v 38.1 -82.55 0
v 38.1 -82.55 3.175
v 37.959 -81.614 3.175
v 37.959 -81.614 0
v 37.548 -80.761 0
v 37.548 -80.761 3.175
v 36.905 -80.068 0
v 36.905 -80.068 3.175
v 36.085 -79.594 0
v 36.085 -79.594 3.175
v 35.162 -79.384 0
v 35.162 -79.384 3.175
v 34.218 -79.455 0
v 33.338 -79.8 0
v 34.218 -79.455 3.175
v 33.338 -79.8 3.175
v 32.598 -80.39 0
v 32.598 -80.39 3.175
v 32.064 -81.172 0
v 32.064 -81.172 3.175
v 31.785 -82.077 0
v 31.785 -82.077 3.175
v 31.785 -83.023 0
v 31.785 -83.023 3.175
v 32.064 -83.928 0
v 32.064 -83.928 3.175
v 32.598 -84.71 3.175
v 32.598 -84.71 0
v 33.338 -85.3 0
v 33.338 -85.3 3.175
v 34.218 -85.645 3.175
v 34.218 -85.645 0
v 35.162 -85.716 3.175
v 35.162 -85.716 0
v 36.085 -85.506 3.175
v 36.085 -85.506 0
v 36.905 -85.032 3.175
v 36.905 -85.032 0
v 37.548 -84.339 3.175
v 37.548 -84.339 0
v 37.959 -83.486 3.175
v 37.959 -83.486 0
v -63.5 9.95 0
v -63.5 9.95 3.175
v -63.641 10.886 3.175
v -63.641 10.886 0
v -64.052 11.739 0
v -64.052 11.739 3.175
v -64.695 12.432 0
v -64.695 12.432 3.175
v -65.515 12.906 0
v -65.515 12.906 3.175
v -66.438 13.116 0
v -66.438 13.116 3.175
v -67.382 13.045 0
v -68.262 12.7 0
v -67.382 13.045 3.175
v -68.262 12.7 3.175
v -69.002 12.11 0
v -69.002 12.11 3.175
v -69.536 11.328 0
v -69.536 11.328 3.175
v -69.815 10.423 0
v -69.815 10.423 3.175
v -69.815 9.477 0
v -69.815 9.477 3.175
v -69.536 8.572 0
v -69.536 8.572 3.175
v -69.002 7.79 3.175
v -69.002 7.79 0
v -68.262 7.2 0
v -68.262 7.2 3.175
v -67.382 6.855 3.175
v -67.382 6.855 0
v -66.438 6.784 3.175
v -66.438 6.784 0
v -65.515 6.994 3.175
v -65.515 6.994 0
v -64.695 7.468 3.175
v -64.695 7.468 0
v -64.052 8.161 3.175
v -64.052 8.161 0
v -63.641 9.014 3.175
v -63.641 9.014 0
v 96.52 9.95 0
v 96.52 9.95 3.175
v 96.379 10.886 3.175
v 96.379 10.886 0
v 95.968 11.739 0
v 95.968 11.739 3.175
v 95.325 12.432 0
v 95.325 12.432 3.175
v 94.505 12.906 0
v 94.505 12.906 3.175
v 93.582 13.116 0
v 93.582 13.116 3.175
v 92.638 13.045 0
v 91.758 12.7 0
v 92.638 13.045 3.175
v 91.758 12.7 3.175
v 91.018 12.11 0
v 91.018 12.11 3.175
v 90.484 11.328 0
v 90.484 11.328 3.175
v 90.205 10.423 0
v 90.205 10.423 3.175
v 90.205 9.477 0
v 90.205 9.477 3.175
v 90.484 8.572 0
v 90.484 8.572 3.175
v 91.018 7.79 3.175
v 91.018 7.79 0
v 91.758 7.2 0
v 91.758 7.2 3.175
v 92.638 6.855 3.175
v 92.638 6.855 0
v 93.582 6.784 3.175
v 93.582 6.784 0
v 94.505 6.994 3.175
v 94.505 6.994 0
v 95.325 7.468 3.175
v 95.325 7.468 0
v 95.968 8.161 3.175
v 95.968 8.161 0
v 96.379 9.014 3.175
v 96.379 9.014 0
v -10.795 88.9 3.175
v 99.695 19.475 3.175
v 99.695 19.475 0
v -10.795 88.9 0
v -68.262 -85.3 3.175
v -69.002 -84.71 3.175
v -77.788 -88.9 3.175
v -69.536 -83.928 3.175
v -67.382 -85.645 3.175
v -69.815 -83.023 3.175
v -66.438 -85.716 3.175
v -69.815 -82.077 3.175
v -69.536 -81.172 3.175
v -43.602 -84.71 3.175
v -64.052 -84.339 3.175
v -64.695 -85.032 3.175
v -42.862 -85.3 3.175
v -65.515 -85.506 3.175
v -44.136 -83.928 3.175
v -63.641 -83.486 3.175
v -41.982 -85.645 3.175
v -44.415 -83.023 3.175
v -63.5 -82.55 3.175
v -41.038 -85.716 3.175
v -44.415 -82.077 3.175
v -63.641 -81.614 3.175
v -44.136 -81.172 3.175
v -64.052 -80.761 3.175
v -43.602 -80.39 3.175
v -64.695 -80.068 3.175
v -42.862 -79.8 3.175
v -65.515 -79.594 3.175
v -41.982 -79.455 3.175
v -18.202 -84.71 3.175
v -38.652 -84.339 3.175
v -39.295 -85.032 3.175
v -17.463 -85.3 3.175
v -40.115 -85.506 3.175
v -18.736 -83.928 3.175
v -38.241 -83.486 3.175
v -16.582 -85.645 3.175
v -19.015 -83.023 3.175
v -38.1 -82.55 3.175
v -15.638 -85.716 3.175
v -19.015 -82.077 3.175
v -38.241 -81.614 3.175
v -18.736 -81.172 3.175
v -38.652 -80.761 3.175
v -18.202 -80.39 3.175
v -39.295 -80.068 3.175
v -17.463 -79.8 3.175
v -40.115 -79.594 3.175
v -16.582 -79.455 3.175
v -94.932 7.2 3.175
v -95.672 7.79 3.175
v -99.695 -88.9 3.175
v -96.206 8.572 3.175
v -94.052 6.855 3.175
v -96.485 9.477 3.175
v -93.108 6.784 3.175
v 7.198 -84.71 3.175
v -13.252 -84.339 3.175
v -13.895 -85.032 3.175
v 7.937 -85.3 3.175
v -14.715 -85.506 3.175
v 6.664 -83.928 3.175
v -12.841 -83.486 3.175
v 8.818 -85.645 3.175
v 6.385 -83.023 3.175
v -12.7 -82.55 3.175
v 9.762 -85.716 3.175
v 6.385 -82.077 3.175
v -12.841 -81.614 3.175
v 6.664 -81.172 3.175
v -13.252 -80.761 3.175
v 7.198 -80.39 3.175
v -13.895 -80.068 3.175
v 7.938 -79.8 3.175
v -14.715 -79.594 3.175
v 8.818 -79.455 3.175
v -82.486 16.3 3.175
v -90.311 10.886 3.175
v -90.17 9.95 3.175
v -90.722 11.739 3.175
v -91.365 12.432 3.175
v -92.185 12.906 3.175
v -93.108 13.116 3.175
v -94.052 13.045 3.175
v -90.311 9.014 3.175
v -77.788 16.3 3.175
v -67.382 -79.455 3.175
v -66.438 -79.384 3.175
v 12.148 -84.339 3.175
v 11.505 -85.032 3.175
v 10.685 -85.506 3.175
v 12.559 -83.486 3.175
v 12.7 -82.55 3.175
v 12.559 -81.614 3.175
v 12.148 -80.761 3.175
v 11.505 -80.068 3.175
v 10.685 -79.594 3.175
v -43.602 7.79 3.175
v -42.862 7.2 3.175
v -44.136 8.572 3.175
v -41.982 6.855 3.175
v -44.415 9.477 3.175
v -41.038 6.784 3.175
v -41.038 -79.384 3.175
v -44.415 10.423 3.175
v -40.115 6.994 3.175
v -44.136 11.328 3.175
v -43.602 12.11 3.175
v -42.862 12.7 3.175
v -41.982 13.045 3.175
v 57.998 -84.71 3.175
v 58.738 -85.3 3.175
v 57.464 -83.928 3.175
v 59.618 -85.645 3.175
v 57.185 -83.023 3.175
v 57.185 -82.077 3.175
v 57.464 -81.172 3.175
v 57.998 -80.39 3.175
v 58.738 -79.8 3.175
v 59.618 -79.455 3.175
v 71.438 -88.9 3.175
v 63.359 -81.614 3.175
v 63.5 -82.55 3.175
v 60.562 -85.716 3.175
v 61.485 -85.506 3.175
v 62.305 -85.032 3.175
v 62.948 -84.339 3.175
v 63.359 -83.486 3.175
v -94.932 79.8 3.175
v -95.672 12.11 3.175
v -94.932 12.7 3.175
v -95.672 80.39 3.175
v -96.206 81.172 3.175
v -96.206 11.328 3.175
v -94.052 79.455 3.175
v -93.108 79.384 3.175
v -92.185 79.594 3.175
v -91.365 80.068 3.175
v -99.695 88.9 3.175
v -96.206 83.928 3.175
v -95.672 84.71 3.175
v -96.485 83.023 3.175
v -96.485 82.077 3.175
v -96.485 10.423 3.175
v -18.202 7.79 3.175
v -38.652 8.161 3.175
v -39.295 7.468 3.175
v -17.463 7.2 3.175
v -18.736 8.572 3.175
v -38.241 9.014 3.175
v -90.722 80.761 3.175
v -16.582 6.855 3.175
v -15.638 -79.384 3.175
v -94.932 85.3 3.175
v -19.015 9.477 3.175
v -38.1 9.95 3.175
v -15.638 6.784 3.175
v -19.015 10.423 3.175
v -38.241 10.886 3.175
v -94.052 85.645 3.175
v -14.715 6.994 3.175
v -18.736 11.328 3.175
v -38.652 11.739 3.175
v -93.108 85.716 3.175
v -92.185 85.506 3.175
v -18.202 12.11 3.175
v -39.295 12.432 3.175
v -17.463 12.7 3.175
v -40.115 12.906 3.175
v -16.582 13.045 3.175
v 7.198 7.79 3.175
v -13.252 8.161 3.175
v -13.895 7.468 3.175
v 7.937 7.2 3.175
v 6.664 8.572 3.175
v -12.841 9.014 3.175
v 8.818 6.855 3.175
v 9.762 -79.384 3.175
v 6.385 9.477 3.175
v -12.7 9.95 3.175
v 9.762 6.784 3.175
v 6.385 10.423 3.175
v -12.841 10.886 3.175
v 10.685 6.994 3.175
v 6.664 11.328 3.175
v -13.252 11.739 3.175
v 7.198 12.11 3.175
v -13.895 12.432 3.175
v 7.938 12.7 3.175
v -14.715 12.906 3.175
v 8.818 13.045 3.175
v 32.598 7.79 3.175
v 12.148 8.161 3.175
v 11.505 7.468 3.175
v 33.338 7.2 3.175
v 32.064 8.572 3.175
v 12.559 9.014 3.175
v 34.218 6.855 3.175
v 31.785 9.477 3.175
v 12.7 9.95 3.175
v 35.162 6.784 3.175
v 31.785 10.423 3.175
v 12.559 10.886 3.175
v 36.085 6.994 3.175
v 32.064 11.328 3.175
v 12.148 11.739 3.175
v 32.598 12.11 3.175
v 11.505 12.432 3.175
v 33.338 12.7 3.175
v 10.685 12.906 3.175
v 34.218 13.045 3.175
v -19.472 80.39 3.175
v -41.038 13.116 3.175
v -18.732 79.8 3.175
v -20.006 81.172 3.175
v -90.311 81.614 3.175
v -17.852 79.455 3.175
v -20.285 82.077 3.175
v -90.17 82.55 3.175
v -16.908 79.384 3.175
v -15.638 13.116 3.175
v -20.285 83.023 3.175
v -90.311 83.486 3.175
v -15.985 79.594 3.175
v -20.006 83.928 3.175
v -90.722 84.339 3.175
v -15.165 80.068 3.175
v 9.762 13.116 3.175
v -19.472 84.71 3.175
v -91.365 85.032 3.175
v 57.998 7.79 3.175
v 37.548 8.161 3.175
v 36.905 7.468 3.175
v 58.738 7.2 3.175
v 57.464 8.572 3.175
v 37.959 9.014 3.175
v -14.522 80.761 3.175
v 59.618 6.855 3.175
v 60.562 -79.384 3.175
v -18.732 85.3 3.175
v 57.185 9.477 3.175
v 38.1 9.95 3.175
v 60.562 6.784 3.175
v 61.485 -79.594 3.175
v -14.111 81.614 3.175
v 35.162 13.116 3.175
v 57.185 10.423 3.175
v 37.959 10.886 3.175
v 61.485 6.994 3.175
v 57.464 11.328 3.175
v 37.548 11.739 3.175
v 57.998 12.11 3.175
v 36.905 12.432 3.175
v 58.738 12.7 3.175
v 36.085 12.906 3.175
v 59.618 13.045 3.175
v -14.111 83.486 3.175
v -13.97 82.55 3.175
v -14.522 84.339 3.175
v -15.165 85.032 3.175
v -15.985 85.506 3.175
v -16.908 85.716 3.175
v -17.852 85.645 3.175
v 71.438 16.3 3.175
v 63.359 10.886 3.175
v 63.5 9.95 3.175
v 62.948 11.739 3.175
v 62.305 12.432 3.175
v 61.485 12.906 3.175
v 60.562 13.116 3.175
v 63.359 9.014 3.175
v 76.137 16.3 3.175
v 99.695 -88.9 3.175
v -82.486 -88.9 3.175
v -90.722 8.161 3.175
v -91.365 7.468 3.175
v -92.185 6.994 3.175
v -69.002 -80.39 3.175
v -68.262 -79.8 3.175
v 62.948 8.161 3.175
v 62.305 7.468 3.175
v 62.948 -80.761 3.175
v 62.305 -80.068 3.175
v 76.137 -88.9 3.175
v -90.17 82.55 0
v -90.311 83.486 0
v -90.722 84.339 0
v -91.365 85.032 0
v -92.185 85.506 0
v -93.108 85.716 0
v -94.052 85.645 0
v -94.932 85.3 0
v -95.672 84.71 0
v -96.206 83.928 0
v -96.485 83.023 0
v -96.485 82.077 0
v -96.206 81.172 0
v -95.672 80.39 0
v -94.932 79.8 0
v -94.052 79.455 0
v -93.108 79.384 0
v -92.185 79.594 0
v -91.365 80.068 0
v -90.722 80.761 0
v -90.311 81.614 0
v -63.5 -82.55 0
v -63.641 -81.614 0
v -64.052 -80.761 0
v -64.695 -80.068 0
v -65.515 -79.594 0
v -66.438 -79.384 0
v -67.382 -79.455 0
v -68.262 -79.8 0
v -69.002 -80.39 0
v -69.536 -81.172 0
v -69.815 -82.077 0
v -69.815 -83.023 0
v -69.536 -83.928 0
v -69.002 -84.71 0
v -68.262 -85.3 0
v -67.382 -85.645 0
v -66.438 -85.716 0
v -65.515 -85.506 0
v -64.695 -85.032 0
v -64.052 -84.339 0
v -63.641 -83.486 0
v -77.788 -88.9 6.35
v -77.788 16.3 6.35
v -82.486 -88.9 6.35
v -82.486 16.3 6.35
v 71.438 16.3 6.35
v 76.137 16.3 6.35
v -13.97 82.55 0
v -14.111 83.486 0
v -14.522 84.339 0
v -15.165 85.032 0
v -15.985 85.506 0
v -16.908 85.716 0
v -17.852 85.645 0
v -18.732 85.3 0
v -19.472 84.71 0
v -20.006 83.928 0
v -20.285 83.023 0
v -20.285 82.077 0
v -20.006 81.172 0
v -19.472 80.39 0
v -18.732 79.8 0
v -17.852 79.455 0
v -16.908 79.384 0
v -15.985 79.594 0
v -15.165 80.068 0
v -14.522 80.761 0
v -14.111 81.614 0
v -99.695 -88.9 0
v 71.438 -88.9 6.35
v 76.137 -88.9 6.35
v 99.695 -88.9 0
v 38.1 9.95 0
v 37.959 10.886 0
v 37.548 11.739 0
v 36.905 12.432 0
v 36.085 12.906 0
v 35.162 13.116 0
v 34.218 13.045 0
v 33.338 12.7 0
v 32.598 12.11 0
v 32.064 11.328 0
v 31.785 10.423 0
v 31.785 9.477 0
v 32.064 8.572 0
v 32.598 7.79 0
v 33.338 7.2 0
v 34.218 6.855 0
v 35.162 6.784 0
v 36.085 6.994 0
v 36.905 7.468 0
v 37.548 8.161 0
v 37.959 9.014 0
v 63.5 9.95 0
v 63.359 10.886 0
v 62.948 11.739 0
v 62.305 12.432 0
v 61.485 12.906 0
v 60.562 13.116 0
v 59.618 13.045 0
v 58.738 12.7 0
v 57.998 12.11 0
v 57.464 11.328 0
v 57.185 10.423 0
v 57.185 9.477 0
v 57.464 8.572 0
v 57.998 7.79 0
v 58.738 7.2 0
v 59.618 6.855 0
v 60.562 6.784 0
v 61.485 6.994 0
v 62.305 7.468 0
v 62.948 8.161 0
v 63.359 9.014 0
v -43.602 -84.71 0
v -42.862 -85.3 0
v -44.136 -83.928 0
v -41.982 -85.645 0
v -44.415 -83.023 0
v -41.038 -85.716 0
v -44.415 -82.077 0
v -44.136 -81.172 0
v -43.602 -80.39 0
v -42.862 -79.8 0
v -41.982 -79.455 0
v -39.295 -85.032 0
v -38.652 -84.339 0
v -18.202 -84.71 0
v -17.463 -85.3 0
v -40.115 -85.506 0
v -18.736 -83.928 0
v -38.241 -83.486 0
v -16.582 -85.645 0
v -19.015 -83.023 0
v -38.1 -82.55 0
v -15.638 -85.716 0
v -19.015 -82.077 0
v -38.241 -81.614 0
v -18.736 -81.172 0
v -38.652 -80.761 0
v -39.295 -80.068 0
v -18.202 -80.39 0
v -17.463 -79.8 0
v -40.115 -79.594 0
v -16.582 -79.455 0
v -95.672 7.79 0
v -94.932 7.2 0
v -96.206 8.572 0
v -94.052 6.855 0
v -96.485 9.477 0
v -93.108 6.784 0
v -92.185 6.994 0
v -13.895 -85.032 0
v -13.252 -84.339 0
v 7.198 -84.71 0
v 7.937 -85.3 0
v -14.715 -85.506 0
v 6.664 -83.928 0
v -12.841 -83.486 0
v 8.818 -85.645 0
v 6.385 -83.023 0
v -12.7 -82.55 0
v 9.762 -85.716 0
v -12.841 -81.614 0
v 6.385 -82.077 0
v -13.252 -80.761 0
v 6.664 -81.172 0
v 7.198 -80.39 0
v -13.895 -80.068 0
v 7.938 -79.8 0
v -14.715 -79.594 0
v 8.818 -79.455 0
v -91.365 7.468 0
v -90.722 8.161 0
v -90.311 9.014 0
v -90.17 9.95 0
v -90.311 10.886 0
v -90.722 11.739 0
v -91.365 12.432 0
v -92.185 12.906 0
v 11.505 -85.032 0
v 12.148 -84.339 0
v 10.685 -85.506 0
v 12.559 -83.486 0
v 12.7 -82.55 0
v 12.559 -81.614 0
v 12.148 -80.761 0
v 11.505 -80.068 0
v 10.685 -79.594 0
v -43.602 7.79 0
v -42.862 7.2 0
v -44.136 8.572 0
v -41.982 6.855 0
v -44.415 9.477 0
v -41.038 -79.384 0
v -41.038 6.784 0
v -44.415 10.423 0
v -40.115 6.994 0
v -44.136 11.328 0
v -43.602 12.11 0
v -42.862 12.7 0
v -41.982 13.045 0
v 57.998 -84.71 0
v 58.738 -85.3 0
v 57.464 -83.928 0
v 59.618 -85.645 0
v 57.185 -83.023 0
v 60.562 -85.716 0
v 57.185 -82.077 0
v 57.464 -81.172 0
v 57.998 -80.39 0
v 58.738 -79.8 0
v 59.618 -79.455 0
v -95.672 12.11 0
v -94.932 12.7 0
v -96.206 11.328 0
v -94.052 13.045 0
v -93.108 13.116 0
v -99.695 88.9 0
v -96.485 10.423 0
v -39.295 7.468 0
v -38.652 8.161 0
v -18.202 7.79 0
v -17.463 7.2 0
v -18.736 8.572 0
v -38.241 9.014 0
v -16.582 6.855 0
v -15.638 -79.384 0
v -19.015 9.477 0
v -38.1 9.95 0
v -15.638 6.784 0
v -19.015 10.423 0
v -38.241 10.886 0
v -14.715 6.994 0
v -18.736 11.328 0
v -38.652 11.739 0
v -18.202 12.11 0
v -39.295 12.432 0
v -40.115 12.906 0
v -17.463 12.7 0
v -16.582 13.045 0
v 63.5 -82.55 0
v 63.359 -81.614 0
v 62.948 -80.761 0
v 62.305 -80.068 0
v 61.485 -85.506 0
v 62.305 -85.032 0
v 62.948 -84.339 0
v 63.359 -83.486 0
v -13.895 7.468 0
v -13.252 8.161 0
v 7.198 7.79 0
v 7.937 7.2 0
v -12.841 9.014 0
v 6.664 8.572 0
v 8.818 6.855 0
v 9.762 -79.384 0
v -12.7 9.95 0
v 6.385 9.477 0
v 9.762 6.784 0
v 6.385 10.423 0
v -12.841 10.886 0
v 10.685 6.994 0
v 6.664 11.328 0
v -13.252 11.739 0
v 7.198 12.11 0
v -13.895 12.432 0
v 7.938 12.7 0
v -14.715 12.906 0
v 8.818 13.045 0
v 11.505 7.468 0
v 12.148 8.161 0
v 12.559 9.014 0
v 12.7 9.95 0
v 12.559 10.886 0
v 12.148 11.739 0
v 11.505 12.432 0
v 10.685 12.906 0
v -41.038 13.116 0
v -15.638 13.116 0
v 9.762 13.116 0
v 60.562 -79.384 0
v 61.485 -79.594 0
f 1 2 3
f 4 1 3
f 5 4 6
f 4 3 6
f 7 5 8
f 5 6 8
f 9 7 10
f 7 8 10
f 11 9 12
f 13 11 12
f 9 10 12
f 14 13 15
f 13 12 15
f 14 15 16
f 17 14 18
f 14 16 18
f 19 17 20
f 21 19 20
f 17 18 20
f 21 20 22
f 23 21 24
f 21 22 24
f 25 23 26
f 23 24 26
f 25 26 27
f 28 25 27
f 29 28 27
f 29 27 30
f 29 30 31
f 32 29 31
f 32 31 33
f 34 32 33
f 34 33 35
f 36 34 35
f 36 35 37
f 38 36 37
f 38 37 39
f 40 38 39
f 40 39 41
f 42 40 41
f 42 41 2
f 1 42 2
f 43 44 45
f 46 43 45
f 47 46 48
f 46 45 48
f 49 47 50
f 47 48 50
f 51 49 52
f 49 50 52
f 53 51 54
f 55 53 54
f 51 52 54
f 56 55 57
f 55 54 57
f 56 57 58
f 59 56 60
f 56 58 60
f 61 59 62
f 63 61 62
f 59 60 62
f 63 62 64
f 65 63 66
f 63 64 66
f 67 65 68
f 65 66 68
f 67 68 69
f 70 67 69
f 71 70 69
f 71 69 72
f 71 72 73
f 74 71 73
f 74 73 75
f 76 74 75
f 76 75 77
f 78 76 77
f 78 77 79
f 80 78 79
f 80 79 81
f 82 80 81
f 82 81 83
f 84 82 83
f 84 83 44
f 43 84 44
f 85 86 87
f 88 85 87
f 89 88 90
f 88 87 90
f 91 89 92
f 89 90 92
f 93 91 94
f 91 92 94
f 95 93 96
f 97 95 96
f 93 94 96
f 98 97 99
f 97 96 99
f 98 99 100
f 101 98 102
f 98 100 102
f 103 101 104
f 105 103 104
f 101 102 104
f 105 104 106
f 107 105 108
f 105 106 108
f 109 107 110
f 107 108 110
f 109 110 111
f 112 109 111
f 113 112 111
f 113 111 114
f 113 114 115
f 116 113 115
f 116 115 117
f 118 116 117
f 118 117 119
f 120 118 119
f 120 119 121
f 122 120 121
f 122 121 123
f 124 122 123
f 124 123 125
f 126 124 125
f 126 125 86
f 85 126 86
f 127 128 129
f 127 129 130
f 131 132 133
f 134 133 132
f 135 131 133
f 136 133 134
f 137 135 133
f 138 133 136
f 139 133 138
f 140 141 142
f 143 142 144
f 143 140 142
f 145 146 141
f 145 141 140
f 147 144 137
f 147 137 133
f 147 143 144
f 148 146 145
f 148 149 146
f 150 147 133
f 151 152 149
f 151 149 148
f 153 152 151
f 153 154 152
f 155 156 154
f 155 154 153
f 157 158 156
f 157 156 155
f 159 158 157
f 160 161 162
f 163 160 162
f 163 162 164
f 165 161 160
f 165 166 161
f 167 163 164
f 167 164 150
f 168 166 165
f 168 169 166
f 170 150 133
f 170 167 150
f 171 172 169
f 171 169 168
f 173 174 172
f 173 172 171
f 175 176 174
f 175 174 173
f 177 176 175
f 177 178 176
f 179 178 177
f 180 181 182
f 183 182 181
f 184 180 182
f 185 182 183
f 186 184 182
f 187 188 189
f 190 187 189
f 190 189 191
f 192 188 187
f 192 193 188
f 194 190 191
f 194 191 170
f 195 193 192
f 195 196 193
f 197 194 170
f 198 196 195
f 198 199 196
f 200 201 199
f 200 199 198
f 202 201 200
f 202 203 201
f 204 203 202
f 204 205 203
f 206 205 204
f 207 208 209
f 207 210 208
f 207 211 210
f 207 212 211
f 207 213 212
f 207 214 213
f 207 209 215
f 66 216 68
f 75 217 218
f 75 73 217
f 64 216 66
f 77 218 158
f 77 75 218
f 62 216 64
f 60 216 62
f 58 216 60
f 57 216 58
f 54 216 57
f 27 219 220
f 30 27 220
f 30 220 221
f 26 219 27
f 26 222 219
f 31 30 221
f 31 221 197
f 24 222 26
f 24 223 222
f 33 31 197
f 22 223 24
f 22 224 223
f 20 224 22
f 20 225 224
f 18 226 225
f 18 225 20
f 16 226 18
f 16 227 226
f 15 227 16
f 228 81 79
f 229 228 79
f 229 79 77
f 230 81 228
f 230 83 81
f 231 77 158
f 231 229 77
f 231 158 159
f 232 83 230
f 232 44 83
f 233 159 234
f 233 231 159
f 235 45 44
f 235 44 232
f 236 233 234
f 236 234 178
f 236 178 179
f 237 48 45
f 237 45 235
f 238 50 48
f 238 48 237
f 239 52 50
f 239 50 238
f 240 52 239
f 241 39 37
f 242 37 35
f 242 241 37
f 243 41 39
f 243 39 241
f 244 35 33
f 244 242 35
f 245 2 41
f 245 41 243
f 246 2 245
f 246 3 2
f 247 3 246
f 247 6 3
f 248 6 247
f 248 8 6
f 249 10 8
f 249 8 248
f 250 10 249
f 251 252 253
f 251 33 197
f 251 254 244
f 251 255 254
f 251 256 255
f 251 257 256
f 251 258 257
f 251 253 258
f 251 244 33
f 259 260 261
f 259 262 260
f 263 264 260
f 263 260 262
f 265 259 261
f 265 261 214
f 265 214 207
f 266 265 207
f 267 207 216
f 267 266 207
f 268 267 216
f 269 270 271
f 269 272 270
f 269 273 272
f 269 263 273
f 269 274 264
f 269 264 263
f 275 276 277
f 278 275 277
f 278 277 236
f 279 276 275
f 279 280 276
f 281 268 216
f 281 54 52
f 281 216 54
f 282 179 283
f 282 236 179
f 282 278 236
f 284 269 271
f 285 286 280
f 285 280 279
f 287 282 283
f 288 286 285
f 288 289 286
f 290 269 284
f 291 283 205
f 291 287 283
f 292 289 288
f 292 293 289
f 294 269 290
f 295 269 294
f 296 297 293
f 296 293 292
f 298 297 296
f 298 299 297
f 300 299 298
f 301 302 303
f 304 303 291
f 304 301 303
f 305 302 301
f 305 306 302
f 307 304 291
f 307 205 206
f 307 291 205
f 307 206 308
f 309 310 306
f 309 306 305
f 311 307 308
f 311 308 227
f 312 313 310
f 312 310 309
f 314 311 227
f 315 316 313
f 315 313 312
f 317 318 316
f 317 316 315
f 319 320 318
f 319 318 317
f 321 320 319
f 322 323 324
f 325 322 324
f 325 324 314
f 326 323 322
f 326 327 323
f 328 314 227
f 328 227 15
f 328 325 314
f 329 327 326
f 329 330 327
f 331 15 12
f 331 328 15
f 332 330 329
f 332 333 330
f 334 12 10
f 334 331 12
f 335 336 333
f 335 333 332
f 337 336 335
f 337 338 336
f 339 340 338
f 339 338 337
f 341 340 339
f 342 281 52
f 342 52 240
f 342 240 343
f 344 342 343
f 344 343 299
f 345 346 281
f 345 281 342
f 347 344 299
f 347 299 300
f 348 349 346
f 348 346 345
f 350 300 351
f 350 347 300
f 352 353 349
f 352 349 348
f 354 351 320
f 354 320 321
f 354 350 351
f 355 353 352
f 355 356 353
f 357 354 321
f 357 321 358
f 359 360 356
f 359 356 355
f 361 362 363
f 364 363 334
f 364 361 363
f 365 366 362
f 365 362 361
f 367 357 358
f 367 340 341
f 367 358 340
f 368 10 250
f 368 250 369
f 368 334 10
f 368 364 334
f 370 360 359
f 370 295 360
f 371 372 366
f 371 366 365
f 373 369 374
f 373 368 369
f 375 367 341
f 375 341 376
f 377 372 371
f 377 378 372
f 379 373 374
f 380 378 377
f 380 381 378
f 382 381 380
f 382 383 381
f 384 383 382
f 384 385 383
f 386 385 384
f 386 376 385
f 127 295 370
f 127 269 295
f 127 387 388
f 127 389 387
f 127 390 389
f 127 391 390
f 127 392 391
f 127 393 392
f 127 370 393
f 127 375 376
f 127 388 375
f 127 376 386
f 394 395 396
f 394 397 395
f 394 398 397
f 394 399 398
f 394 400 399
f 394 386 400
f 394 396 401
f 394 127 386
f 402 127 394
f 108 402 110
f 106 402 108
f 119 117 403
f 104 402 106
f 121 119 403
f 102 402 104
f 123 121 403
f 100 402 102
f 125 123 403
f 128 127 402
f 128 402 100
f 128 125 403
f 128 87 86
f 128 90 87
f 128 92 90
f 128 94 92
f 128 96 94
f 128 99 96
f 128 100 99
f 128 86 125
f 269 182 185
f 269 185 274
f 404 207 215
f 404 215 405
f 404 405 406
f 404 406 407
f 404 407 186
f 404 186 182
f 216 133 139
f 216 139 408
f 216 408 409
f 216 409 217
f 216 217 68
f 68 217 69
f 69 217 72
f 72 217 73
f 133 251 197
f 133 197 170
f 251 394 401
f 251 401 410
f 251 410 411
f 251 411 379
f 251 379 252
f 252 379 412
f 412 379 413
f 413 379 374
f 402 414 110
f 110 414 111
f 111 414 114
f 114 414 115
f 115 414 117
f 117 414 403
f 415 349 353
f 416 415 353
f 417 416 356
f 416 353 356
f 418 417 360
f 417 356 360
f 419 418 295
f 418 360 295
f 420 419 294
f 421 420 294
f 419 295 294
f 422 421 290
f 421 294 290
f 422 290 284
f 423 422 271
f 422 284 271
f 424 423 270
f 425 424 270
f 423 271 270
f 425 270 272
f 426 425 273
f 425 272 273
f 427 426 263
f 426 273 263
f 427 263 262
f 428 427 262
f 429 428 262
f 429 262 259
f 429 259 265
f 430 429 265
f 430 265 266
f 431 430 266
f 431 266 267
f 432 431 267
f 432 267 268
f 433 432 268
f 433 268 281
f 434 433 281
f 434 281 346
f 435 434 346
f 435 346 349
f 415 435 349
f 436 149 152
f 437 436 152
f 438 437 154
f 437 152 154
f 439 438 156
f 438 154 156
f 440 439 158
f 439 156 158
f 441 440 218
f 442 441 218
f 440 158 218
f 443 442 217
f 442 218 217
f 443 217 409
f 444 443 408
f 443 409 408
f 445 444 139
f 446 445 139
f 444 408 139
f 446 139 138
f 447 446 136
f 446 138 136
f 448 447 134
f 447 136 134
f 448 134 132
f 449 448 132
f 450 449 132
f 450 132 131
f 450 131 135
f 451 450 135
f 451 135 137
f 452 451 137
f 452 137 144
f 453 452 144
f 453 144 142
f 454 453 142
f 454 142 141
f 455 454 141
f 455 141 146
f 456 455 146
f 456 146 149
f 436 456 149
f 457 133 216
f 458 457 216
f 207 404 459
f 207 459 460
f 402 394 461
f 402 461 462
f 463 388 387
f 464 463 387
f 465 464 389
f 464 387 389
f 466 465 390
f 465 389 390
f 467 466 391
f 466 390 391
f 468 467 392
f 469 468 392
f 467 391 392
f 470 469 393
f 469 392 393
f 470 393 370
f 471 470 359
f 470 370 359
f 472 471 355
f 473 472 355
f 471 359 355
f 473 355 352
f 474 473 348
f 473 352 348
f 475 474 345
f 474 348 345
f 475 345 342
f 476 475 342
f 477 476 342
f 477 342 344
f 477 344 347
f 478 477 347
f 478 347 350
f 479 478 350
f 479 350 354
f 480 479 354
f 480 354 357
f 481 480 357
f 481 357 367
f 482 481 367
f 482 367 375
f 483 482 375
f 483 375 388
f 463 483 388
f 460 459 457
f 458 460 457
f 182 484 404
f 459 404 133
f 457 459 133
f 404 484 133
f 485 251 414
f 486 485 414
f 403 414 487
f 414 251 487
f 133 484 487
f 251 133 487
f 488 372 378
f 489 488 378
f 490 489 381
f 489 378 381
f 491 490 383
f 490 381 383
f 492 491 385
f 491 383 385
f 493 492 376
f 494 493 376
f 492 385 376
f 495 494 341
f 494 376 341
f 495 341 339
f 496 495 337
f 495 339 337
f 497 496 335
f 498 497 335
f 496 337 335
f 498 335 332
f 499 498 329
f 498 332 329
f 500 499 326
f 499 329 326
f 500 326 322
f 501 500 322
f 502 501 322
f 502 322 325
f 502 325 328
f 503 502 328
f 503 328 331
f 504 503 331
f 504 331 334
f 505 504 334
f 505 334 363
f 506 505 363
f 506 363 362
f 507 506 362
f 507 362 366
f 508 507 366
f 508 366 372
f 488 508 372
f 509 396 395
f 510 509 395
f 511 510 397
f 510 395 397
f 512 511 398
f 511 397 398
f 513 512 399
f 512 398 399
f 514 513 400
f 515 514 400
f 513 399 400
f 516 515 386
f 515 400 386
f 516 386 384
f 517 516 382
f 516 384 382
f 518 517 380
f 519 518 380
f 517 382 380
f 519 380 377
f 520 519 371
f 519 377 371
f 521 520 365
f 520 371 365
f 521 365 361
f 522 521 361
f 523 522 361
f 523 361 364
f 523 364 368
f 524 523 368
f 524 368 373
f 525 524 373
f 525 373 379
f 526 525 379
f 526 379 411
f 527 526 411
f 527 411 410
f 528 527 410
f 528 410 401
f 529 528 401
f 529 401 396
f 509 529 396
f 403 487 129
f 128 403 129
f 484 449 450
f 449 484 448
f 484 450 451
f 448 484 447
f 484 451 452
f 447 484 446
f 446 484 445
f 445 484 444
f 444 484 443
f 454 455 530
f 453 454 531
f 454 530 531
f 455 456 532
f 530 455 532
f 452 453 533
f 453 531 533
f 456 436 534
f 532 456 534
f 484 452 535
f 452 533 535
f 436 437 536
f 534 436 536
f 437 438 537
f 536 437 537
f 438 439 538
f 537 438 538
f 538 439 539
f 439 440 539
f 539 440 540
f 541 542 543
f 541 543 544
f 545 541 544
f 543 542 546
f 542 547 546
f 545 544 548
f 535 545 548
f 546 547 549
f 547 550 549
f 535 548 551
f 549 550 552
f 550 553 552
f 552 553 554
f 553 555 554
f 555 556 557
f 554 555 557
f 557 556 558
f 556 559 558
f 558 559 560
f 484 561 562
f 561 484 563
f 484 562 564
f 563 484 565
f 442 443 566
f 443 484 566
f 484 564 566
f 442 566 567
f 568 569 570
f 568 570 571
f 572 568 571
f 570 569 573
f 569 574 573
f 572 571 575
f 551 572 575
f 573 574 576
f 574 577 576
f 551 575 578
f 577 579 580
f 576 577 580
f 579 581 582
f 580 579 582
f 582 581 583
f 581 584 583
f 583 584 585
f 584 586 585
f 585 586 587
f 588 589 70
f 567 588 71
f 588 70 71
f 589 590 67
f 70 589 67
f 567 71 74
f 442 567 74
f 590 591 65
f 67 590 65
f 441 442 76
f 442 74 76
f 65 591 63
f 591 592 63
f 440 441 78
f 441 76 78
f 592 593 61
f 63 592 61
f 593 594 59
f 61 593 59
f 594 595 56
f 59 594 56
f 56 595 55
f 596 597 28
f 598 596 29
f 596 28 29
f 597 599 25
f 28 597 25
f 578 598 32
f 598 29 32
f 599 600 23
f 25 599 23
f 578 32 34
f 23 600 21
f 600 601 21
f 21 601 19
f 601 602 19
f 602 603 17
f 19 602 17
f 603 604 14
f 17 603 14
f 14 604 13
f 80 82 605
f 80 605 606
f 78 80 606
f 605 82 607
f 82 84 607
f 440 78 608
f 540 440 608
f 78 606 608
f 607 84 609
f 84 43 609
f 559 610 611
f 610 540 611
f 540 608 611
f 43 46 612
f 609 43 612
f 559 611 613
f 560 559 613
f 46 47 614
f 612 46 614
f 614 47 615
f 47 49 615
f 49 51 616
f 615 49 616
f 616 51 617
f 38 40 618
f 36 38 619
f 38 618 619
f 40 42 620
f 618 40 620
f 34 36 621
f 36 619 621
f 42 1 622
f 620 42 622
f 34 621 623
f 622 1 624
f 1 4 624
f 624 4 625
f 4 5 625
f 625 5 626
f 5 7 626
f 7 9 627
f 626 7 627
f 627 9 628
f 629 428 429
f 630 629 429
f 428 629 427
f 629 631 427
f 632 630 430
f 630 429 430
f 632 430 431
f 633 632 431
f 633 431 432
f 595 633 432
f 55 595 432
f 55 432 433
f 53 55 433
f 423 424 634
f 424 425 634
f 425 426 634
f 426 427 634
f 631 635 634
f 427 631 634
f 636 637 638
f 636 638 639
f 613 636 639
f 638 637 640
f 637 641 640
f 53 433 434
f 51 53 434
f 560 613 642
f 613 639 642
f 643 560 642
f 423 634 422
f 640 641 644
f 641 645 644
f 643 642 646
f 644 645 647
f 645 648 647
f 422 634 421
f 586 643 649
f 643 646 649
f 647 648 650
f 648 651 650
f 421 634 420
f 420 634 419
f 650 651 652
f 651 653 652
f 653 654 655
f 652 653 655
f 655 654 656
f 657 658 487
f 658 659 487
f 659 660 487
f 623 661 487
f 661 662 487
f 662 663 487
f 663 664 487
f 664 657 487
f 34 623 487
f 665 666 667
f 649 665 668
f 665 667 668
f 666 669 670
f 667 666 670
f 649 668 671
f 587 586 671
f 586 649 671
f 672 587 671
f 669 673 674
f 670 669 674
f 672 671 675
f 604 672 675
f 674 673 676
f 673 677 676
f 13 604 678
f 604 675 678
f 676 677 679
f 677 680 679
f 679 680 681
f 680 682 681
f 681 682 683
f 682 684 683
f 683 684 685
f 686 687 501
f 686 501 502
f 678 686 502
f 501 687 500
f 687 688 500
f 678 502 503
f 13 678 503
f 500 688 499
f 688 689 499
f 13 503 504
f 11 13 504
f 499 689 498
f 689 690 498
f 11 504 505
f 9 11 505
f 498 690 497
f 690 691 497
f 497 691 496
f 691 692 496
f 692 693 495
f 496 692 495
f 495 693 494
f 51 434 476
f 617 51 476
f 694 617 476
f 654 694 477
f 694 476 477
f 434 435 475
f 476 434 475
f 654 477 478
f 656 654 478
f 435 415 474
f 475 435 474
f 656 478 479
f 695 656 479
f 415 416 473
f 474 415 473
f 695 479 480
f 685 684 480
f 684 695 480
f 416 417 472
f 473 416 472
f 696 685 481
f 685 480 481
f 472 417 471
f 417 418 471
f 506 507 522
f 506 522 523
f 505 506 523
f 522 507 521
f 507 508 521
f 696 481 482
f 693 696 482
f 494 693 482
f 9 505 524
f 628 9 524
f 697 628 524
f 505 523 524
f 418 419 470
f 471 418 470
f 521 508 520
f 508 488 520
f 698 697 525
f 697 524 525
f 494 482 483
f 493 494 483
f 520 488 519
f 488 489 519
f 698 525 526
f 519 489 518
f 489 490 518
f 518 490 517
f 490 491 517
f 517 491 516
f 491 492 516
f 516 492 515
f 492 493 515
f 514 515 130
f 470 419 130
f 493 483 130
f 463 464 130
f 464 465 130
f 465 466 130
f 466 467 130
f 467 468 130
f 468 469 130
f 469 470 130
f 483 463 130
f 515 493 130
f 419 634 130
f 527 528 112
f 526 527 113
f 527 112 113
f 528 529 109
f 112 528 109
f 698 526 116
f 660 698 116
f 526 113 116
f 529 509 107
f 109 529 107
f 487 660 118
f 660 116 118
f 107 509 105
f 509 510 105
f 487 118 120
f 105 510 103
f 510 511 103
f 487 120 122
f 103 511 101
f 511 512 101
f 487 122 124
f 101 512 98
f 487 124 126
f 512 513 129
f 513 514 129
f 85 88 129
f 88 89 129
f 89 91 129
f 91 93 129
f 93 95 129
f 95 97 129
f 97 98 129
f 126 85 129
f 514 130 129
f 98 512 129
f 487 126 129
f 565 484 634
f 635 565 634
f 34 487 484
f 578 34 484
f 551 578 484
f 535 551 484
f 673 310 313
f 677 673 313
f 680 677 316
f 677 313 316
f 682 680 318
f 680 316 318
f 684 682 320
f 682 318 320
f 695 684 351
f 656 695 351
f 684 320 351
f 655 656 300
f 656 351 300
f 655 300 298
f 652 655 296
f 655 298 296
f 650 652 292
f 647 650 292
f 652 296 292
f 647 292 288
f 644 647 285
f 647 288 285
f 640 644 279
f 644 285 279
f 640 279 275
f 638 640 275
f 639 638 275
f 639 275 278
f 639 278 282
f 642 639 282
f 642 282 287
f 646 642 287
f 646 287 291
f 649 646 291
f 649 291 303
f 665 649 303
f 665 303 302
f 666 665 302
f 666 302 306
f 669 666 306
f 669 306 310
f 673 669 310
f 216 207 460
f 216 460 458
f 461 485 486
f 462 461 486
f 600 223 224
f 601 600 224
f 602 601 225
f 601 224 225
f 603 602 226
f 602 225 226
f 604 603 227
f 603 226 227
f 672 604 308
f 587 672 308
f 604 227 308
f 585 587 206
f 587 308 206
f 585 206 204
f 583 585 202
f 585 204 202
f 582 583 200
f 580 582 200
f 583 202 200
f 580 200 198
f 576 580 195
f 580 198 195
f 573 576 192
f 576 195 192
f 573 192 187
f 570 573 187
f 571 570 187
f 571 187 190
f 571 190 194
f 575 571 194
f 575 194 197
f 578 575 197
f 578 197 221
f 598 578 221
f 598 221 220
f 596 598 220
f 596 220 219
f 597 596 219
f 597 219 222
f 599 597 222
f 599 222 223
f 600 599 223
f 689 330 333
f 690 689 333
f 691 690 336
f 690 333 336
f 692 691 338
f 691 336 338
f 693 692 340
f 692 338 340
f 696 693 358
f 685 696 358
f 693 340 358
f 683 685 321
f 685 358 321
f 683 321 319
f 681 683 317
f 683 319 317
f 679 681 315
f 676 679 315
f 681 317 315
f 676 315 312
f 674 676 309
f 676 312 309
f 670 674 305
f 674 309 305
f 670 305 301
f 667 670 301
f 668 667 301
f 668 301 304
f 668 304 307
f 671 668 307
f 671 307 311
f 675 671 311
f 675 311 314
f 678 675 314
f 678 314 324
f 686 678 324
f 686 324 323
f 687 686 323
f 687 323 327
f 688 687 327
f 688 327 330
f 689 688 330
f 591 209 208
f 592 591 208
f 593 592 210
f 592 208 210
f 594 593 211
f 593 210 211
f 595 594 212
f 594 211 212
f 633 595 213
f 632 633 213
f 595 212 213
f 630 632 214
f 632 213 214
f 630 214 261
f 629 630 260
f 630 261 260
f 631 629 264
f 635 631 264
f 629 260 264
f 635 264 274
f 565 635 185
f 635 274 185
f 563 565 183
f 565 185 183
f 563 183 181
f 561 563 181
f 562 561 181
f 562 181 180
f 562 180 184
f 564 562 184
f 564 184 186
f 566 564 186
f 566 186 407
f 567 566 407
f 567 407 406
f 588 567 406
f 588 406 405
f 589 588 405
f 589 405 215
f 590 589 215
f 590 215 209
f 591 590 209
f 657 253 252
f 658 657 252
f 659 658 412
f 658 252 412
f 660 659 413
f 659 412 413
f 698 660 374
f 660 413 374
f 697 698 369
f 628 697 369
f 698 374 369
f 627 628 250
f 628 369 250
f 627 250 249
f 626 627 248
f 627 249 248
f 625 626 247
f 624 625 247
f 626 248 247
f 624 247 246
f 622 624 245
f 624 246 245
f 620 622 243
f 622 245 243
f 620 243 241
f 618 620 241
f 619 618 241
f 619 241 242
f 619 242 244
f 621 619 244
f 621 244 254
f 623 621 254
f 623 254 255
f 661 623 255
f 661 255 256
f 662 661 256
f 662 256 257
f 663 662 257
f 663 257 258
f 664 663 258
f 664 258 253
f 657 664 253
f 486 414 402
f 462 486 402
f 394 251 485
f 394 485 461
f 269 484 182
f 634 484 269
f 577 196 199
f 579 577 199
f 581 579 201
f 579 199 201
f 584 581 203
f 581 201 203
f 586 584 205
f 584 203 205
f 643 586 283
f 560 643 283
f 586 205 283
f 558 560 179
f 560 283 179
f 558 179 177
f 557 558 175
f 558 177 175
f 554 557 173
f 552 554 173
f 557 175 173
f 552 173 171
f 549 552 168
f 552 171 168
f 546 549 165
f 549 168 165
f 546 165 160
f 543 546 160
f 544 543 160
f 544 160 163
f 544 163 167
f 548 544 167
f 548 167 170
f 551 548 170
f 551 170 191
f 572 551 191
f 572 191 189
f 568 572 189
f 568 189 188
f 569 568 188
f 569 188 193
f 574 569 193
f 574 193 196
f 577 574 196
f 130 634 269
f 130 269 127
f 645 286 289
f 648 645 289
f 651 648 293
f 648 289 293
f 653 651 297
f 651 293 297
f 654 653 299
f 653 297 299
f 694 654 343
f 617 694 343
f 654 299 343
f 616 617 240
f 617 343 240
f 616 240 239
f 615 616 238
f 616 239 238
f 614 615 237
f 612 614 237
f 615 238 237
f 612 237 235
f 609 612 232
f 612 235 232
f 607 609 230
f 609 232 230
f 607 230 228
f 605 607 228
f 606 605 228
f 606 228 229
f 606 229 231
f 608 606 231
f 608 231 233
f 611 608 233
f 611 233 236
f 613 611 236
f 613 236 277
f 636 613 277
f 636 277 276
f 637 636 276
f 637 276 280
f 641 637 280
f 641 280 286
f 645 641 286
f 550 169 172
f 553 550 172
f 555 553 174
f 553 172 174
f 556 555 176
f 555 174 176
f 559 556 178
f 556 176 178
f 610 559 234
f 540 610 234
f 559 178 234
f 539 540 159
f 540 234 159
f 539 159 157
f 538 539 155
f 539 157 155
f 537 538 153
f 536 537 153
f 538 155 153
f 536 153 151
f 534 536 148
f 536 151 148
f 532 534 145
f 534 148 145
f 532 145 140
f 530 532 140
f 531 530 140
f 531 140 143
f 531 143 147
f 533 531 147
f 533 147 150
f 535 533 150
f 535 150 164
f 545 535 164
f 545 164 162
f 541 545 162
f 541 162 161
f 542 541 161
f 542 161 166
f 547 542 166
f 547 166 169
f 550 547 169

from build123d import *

# Parameters (mm, degrees)
SKETCH1_W           = 199.39
SKETCH1_H           = 177.8
BOSS_EXTRUDE1_DEPTH = 3.175
CUT_EXTRUDE4_DEPTH  = 134.612812447
SKETCH7_R           = 3.175
CUT_EXTRUDE5_DEPTH  = 134.612812447
SKETCH8_W           = 4.699
SKETCH8_H           = 105.199999912
BOSS_EXTRUDE2_DEPTH = 3.175


with BuildPart() as part:
    # Sketch1 → Boss-Extrude1 (new body)
    with BuildSketch(Plane.XY):
        Rectangle(SKETCH1_W, SKETCH1_H)
    extrude(amount=BOSS_EXTRUDE1_DEPTH)

    # Sketch6 → Cut-Extrude4 (cut, through all)
    with BuildSketch(Plane.XY.offset(3.175)):
        Polygon((99.695, 88.9), (99.695, 19.474999912), (-10.795, 88.9), align=None)
    extrude(amount=-CUT_EXTRUDE4_DEPTH, mode=Mode.SUBTRACT)

    # Sketch7 → Cut-Extrude5 (cut, through all)
    with BuildSketch(Plane.XY.offset(3.175)):
        with Locations((-93.345, 82.55)):
            Circle(SKETCH7_R)
        with Locations((-93.345, 9.949999912)):
            Circle(SKETCH7_R)
        with Locations((93.345, 9.949999912)):
            Circle(SKETCH7_R)
        with Locations((-66.675, 9.949999912)):
            Circle(SKETCH7_R)
        with Locations((-41.275, 9.949999912)):
            Circle(SKETCH7_R)
        with Locations((-15.875, 9.949999912)):
            Circle(SKETCH7_R)
        with Locations((9.525, 9.949999912)):
            Circle(SKETCH7_R)
        with Locations((34.925, 9.949999912)):
            Circle(SKETCH7_R)
        with Locations((60.325, 9.949999912)):
            Circle(SKETCH7_R)
        with Locations((-17.145, 82.55)):
            Circle(SKETCH7_R)
        with Locations((-66.675, -82.55)):
            Circle(SKETCH7_R)
        with Locations((-41.275, -82.55)):
            Circle(SKETCH7_R)
        with Locations((-15.875, -82.55)):
            Circle(SKETCH7_R)
        with Locations((9.525, -82.55)):
            Circle(SKETCH7_R)
        with Locations((34.925, -82.55)):
            Circle(SKETCH7_R)
        with Locations((60.325, -82.55)):
            Circle(SKETCH7_R)
    extrude(amount=-CUT_EXTRUDE5_DEPTH, mode=Mode.SUBTRACT)

    # Sketch8 → Boss-Extrude2 (add)
    with BuildSketch(Plane.XY.offset(3.175)):
        with Locations((-80.137, -36.300000044)):
            Rectangle(SKETCH8_W, SKETCH8_H)
        with Locations((73.787, -36.300000044)):
            Rectangle(SKETCH8_W, SKETCH8_H)
    extrude(amount=BOSS_EXTRUDE2_DEPTH)


solid = part.part
